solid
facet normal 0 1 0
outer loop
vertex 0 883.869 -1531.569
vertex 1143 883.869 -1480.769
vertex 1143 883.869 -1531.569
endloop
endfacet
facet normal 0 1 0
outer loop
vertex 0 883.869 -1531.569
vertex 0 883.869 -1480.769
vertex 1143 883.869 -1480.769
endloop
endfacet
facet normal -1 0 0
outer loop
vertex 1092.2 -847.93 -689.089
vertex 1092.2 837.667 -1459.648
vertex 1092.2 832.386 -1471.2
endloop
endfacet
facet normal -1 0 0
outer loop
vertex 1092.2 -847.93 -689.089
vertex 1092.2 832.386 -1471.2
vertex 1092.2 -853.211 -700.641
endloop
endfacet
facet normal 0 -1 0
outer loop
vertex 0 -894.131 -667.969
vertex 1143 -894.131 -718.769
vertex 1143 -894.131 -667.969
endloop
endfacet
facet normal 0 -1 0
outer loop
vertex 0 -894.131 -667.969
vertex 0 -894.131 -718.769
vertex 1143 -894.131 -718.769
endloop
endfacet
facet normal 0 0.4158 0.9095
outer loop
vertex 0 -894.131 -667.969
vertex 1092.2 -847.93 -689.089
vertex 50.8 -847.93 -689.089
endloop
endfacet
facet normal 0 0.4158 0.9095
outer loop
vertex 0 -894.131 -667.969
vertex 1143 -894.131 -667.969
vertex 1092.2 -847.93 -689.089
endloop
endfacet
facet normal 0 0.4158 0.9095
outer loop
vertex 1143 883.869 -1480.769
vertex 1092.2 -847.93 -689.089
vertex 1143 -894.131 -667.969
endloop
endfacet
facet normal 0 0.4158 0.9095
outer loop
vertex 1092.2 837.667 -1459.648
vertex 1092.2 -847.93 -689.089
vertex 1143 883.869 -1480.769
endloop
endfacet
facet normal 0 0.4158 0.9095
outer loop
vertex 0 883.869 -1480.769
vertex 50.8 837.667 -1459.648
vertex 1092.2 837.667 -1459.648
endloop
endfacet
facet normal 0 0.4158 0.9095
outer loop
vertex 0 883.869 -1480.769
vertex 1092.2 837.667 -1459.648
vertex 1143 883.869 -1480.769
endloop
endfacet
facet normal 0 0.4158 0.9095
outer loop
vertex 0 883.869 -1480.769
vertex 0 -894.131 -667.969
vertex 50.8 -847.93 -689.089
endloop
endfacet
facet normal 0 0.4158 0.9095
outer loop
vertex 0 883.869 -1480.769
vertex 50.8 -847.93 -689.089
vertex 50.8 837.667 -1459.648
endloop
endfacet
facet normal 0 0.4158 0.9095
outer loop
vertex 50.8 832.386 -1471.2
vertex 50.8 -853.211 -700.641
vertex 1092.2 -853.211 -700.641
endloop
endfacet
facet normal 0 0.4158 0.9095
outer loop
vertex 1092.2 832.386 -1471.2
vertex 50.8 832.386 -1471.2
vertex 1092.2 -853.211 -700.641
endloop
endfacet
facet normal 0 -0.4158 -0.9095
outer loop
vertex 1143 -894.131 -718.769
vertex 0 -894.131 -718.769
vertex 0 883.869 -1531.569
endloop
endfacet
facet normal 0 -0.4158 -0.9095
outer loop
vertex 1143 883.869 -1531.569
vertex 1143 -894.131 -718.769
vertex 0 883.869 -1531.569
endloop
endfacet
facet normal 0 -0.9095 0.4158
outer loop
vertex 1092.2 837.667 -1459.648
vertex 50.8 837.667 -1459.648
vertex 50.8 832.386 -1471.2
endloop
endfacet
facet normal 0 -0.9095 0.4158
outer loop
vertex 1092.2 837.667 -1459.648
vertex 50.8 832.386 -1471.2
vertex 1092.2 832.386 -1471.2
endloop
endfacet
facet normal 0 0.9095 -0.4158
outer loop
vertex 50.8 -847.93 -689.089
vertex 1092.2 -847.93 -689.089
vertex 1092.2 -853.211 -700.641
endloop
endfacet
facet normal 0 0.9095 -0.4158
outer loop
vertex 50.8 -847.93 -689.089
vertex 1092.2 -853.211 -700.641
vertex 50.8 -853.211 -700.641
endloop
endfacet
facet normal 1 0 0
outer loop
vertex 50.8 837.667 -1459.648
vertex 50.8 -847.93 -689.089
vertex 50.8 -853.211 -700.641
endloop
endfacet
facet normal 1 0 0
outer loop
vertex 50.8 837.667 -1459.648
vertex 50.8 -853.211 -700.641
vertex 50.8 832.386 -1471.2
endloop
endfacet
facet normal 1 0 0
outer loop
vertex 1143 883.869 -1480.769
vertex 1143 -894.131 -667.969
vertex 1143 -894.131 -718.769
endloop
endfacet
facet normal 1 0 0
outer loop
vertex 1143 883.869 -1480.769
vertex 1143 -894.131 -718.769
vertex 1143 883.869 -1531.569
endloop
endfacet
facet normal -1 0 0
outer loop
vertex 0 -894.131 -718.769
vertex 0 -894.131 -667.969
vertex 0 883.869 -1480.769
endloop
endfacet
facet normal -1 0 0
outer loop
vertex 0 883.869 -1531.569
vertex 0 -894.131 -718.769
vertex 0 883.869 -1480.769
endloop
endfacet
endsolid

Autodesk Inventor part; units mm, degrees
ref_plane "YZ Plane" through (0, 0, 0) normal (1, 0, 0) x (0, 1, 0)
ref_plane "XZ Plane" through (0, 0, 0) normal (0, 1, 0) x (-1, 0, 0)
ref_plane "XY Plane" through (0, 0, 0) normal (0, 0, 1) x (1, 0, 0)
sketch "Sketch2" plane through (0, 0, 0) normal (1, 0, 0) x (0, 1, 0)
  line L0 (-894.1313, -718.7686) -> (883.8687, -1531.5686)
  line L1 (-894.1313, -667.9686) -> (883.8687, -1480.7686)
  line L2 (-894.1313, -667.9686) -> (883.8687, -667.9686)
  line L3 (-894.1313, -718.7686) -> (-894.1313, -667.9686)
  line L4 (883.8687, -1480.7686) -> (883.8687, -1531.5686)
  point P0 (0, 0)
  dimension "d4" = 1778
  dimension "d5" = 50.8
  dimension "d6" = 50.8
  dimension "d7" = 812.8
extrude "Extrusion2" add sketch "Sketch2" along normal blind 1143
sketch "Sketch3" plane through (0, -894.1313, -667.9686) normal (0, 0.4157598, 0.9094745) x (1, 0, 0)
  line L0 (50.8, 1904.1752) -> (1092.2, 1904.1752)
  line L1 (1092.2, 1904.1752) -> (1092.2, 50.8)
  line L2 (1092.2, 50.8) -> (50.8, 50.8)
  line L3 (50.8, 50.8) -> (50.8, 1904.1752)
  line L4 (0, 0) -> (1143, 0) projected
  line L5 (1143, 1954.9752) -> (1143, 0) projected
  line L6 (0, 1954.9752) -> (0, 0) projected
  line L7 (0, 1954.9752) -> (1143, 1954.9752) projected
  point P0 (0, 535.4751)
  dimension "d10" = 50.8
  dimension "d11" = 50.8
  dimension "d12" = 50.8
  dimension "d13" = 50.8
extrude "Extrusion3" cut sketch "Sketch3" against normal blind 12.7 contours L0 L1 L2 L3
equation "\"BendRadius\" = Thickness"
equation "\"BendReliefWidth\" = Thickness"
equation "\"BendReliefDepth\" = 0.5 * Thickness"
equation "\"CornerReliefSize\" = 4 * Thickness"
equation "\"MinimumRemnant\" = 2 * Thickness"
equation "\"TransitionRadius\" = BendRadius"
equation "\"JacobiRadiusSize\" = BendRadius"
equation "\"GapSize\" = Thickness"
equation "\"Thickness\" = 3.048"
properties part number "screen"
